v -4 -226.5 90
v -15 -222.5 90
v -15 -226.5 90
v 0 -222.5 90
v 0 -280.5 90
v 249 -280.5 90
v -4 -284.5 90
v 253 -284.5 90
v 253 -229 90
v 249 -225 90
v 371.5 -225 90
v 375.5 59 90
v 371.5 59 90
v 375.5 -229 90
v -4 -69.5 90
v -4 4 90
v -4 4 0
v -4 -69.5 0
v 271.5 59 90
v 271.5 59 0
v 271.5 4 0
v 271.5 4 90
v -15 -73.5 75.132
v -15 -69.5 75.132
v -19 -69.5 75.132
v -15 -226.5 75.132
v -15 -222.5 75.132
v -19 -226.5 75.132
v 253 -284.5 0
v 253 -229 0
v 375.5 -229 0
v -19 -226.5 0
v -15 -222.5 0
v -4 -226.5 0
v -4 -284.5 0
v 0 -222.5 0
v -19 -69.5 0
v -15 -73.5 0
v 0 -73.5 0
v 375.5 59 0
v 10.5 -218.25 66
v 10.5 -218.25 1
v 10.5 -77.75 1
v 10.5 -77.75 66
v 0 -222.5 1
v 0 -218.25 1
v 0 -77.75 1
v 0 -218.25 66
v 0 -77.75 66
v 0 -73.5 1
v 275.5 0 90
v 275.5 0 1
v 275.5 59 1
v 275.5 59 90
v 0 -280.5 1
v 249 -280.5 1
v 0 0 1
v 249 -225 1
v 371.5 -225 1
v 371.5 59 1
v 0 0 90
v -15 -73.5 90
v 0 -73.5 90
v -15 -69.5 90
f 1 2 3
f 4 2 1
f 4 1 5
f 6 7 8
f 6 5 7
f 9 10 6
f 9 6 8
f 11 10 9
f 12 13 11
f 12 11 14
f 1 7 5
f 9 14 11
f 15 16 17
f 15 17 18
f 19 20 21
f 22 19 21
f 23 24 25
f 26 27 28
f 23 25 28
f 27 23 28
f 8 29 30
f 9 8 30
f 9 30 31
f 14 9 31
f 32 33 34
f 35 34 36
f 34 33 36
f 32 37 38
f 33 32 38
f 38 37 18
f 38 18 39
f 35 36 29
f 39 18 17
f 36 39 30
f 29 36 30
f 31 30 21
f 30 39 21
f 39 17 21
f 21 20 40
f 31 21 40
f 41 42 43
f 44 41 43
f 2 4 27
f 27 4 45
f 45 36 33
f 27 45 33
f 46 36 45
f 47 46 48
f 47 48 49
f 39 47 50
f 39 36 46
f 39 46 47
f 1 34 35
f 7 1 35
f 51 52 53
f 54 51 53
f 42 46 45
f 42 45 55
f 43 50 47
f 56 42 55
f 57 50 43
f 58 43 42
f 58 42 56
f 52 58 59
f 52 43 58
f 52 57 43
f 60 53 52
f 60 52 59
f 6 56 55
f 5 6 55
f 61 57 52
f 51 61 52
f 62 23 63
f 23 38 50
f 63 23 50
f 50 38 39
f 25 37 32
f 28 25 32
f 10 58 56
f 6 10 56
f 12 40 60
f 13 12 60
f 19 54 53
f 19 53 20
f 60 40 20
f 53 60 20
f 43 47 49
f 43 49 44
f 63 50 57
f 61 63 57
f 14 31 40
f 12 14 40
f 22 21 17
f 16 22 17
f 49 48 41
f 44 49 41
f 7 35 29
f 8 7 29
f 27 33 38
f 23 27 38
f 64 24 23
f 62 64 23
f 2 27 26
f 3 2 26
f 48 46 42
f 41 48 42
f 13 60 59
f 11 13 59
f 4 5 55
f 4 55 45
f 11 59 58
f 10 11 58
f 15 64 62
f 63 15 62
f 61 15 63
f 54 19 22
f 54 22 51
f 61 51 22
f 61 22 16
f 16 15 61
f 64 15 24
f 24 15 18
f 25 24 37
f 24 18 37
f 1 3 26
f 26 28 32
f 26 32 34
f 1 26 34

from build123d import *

# Parameters (mm, degrees)
F1_DEPTH = 90
F2_DEPTH = 1
F0_W     = 10.5
F0_H     = 140.5
F3_DEPTH = 66
F4_W     = 157
F4_H     = 14.86842
F5_DEPTH = 4


with BuildPart() as f1:
    # F0 (on Top) → F1 (new body)
    with BuildSketch(Plane.XY):
        Polygon((0, -73.5), (0, 0), (275.5, 0), (275.5, 59), (271.5, 59), (271.5, 4), (-4, 4), (-4, -69.5), (-19, -69.5), (-19, -226.5), (-4, -226.5), (-4, -284.5), (253, -284.5), (253, -229), (375.5, -229), (375.5, 59), (371.5, 59), (371.5, 0), (371.5, -225), (249, -225), (249, -280.5), (0, -280.5), (0, -222.5), (-15, -222.5), (-15, -73.5), align=None)
    extrude(amount=F1_DEPTH)

    # F0 (on Top) → F2 (join)
    with BuildSketch(Plane.XY):
        Polygon((275.5, 0), (0, 0), (0, -73.5), (0, -77.75), (10.5, -77.75), (10.5, -218.25), (0, -218.25), (0, -222.5), (0, -280.5), (249, -280.5), (249, -225), (371.5, -225), (371.5, 0), (371.5, 59), (275.5, 59), align=None)
    extrude(amount=F2_DEPTH)

    # F0 (on Top) → F3 (join)
    with BuildSketch(Plane.XY):
        with Locations((5.25, -148)):
            Rectangle(F0_W, F0_H)
    extrude(amount=F3_DEPTH)

    # F4 (on face) → F5 (cut)
    with BuildSketch(Plane(origin=(-19, 0, 0), x_dir=(0, -1, 0), z_dir=(-1, 0, 0))):
        with Locations((148, 82.56579)):
            Rectangle(F4_W, F4_H)
    extrude(amount=-F5_DEPTH, mode=Mode.SUBTRACT)


solid = f1.part
